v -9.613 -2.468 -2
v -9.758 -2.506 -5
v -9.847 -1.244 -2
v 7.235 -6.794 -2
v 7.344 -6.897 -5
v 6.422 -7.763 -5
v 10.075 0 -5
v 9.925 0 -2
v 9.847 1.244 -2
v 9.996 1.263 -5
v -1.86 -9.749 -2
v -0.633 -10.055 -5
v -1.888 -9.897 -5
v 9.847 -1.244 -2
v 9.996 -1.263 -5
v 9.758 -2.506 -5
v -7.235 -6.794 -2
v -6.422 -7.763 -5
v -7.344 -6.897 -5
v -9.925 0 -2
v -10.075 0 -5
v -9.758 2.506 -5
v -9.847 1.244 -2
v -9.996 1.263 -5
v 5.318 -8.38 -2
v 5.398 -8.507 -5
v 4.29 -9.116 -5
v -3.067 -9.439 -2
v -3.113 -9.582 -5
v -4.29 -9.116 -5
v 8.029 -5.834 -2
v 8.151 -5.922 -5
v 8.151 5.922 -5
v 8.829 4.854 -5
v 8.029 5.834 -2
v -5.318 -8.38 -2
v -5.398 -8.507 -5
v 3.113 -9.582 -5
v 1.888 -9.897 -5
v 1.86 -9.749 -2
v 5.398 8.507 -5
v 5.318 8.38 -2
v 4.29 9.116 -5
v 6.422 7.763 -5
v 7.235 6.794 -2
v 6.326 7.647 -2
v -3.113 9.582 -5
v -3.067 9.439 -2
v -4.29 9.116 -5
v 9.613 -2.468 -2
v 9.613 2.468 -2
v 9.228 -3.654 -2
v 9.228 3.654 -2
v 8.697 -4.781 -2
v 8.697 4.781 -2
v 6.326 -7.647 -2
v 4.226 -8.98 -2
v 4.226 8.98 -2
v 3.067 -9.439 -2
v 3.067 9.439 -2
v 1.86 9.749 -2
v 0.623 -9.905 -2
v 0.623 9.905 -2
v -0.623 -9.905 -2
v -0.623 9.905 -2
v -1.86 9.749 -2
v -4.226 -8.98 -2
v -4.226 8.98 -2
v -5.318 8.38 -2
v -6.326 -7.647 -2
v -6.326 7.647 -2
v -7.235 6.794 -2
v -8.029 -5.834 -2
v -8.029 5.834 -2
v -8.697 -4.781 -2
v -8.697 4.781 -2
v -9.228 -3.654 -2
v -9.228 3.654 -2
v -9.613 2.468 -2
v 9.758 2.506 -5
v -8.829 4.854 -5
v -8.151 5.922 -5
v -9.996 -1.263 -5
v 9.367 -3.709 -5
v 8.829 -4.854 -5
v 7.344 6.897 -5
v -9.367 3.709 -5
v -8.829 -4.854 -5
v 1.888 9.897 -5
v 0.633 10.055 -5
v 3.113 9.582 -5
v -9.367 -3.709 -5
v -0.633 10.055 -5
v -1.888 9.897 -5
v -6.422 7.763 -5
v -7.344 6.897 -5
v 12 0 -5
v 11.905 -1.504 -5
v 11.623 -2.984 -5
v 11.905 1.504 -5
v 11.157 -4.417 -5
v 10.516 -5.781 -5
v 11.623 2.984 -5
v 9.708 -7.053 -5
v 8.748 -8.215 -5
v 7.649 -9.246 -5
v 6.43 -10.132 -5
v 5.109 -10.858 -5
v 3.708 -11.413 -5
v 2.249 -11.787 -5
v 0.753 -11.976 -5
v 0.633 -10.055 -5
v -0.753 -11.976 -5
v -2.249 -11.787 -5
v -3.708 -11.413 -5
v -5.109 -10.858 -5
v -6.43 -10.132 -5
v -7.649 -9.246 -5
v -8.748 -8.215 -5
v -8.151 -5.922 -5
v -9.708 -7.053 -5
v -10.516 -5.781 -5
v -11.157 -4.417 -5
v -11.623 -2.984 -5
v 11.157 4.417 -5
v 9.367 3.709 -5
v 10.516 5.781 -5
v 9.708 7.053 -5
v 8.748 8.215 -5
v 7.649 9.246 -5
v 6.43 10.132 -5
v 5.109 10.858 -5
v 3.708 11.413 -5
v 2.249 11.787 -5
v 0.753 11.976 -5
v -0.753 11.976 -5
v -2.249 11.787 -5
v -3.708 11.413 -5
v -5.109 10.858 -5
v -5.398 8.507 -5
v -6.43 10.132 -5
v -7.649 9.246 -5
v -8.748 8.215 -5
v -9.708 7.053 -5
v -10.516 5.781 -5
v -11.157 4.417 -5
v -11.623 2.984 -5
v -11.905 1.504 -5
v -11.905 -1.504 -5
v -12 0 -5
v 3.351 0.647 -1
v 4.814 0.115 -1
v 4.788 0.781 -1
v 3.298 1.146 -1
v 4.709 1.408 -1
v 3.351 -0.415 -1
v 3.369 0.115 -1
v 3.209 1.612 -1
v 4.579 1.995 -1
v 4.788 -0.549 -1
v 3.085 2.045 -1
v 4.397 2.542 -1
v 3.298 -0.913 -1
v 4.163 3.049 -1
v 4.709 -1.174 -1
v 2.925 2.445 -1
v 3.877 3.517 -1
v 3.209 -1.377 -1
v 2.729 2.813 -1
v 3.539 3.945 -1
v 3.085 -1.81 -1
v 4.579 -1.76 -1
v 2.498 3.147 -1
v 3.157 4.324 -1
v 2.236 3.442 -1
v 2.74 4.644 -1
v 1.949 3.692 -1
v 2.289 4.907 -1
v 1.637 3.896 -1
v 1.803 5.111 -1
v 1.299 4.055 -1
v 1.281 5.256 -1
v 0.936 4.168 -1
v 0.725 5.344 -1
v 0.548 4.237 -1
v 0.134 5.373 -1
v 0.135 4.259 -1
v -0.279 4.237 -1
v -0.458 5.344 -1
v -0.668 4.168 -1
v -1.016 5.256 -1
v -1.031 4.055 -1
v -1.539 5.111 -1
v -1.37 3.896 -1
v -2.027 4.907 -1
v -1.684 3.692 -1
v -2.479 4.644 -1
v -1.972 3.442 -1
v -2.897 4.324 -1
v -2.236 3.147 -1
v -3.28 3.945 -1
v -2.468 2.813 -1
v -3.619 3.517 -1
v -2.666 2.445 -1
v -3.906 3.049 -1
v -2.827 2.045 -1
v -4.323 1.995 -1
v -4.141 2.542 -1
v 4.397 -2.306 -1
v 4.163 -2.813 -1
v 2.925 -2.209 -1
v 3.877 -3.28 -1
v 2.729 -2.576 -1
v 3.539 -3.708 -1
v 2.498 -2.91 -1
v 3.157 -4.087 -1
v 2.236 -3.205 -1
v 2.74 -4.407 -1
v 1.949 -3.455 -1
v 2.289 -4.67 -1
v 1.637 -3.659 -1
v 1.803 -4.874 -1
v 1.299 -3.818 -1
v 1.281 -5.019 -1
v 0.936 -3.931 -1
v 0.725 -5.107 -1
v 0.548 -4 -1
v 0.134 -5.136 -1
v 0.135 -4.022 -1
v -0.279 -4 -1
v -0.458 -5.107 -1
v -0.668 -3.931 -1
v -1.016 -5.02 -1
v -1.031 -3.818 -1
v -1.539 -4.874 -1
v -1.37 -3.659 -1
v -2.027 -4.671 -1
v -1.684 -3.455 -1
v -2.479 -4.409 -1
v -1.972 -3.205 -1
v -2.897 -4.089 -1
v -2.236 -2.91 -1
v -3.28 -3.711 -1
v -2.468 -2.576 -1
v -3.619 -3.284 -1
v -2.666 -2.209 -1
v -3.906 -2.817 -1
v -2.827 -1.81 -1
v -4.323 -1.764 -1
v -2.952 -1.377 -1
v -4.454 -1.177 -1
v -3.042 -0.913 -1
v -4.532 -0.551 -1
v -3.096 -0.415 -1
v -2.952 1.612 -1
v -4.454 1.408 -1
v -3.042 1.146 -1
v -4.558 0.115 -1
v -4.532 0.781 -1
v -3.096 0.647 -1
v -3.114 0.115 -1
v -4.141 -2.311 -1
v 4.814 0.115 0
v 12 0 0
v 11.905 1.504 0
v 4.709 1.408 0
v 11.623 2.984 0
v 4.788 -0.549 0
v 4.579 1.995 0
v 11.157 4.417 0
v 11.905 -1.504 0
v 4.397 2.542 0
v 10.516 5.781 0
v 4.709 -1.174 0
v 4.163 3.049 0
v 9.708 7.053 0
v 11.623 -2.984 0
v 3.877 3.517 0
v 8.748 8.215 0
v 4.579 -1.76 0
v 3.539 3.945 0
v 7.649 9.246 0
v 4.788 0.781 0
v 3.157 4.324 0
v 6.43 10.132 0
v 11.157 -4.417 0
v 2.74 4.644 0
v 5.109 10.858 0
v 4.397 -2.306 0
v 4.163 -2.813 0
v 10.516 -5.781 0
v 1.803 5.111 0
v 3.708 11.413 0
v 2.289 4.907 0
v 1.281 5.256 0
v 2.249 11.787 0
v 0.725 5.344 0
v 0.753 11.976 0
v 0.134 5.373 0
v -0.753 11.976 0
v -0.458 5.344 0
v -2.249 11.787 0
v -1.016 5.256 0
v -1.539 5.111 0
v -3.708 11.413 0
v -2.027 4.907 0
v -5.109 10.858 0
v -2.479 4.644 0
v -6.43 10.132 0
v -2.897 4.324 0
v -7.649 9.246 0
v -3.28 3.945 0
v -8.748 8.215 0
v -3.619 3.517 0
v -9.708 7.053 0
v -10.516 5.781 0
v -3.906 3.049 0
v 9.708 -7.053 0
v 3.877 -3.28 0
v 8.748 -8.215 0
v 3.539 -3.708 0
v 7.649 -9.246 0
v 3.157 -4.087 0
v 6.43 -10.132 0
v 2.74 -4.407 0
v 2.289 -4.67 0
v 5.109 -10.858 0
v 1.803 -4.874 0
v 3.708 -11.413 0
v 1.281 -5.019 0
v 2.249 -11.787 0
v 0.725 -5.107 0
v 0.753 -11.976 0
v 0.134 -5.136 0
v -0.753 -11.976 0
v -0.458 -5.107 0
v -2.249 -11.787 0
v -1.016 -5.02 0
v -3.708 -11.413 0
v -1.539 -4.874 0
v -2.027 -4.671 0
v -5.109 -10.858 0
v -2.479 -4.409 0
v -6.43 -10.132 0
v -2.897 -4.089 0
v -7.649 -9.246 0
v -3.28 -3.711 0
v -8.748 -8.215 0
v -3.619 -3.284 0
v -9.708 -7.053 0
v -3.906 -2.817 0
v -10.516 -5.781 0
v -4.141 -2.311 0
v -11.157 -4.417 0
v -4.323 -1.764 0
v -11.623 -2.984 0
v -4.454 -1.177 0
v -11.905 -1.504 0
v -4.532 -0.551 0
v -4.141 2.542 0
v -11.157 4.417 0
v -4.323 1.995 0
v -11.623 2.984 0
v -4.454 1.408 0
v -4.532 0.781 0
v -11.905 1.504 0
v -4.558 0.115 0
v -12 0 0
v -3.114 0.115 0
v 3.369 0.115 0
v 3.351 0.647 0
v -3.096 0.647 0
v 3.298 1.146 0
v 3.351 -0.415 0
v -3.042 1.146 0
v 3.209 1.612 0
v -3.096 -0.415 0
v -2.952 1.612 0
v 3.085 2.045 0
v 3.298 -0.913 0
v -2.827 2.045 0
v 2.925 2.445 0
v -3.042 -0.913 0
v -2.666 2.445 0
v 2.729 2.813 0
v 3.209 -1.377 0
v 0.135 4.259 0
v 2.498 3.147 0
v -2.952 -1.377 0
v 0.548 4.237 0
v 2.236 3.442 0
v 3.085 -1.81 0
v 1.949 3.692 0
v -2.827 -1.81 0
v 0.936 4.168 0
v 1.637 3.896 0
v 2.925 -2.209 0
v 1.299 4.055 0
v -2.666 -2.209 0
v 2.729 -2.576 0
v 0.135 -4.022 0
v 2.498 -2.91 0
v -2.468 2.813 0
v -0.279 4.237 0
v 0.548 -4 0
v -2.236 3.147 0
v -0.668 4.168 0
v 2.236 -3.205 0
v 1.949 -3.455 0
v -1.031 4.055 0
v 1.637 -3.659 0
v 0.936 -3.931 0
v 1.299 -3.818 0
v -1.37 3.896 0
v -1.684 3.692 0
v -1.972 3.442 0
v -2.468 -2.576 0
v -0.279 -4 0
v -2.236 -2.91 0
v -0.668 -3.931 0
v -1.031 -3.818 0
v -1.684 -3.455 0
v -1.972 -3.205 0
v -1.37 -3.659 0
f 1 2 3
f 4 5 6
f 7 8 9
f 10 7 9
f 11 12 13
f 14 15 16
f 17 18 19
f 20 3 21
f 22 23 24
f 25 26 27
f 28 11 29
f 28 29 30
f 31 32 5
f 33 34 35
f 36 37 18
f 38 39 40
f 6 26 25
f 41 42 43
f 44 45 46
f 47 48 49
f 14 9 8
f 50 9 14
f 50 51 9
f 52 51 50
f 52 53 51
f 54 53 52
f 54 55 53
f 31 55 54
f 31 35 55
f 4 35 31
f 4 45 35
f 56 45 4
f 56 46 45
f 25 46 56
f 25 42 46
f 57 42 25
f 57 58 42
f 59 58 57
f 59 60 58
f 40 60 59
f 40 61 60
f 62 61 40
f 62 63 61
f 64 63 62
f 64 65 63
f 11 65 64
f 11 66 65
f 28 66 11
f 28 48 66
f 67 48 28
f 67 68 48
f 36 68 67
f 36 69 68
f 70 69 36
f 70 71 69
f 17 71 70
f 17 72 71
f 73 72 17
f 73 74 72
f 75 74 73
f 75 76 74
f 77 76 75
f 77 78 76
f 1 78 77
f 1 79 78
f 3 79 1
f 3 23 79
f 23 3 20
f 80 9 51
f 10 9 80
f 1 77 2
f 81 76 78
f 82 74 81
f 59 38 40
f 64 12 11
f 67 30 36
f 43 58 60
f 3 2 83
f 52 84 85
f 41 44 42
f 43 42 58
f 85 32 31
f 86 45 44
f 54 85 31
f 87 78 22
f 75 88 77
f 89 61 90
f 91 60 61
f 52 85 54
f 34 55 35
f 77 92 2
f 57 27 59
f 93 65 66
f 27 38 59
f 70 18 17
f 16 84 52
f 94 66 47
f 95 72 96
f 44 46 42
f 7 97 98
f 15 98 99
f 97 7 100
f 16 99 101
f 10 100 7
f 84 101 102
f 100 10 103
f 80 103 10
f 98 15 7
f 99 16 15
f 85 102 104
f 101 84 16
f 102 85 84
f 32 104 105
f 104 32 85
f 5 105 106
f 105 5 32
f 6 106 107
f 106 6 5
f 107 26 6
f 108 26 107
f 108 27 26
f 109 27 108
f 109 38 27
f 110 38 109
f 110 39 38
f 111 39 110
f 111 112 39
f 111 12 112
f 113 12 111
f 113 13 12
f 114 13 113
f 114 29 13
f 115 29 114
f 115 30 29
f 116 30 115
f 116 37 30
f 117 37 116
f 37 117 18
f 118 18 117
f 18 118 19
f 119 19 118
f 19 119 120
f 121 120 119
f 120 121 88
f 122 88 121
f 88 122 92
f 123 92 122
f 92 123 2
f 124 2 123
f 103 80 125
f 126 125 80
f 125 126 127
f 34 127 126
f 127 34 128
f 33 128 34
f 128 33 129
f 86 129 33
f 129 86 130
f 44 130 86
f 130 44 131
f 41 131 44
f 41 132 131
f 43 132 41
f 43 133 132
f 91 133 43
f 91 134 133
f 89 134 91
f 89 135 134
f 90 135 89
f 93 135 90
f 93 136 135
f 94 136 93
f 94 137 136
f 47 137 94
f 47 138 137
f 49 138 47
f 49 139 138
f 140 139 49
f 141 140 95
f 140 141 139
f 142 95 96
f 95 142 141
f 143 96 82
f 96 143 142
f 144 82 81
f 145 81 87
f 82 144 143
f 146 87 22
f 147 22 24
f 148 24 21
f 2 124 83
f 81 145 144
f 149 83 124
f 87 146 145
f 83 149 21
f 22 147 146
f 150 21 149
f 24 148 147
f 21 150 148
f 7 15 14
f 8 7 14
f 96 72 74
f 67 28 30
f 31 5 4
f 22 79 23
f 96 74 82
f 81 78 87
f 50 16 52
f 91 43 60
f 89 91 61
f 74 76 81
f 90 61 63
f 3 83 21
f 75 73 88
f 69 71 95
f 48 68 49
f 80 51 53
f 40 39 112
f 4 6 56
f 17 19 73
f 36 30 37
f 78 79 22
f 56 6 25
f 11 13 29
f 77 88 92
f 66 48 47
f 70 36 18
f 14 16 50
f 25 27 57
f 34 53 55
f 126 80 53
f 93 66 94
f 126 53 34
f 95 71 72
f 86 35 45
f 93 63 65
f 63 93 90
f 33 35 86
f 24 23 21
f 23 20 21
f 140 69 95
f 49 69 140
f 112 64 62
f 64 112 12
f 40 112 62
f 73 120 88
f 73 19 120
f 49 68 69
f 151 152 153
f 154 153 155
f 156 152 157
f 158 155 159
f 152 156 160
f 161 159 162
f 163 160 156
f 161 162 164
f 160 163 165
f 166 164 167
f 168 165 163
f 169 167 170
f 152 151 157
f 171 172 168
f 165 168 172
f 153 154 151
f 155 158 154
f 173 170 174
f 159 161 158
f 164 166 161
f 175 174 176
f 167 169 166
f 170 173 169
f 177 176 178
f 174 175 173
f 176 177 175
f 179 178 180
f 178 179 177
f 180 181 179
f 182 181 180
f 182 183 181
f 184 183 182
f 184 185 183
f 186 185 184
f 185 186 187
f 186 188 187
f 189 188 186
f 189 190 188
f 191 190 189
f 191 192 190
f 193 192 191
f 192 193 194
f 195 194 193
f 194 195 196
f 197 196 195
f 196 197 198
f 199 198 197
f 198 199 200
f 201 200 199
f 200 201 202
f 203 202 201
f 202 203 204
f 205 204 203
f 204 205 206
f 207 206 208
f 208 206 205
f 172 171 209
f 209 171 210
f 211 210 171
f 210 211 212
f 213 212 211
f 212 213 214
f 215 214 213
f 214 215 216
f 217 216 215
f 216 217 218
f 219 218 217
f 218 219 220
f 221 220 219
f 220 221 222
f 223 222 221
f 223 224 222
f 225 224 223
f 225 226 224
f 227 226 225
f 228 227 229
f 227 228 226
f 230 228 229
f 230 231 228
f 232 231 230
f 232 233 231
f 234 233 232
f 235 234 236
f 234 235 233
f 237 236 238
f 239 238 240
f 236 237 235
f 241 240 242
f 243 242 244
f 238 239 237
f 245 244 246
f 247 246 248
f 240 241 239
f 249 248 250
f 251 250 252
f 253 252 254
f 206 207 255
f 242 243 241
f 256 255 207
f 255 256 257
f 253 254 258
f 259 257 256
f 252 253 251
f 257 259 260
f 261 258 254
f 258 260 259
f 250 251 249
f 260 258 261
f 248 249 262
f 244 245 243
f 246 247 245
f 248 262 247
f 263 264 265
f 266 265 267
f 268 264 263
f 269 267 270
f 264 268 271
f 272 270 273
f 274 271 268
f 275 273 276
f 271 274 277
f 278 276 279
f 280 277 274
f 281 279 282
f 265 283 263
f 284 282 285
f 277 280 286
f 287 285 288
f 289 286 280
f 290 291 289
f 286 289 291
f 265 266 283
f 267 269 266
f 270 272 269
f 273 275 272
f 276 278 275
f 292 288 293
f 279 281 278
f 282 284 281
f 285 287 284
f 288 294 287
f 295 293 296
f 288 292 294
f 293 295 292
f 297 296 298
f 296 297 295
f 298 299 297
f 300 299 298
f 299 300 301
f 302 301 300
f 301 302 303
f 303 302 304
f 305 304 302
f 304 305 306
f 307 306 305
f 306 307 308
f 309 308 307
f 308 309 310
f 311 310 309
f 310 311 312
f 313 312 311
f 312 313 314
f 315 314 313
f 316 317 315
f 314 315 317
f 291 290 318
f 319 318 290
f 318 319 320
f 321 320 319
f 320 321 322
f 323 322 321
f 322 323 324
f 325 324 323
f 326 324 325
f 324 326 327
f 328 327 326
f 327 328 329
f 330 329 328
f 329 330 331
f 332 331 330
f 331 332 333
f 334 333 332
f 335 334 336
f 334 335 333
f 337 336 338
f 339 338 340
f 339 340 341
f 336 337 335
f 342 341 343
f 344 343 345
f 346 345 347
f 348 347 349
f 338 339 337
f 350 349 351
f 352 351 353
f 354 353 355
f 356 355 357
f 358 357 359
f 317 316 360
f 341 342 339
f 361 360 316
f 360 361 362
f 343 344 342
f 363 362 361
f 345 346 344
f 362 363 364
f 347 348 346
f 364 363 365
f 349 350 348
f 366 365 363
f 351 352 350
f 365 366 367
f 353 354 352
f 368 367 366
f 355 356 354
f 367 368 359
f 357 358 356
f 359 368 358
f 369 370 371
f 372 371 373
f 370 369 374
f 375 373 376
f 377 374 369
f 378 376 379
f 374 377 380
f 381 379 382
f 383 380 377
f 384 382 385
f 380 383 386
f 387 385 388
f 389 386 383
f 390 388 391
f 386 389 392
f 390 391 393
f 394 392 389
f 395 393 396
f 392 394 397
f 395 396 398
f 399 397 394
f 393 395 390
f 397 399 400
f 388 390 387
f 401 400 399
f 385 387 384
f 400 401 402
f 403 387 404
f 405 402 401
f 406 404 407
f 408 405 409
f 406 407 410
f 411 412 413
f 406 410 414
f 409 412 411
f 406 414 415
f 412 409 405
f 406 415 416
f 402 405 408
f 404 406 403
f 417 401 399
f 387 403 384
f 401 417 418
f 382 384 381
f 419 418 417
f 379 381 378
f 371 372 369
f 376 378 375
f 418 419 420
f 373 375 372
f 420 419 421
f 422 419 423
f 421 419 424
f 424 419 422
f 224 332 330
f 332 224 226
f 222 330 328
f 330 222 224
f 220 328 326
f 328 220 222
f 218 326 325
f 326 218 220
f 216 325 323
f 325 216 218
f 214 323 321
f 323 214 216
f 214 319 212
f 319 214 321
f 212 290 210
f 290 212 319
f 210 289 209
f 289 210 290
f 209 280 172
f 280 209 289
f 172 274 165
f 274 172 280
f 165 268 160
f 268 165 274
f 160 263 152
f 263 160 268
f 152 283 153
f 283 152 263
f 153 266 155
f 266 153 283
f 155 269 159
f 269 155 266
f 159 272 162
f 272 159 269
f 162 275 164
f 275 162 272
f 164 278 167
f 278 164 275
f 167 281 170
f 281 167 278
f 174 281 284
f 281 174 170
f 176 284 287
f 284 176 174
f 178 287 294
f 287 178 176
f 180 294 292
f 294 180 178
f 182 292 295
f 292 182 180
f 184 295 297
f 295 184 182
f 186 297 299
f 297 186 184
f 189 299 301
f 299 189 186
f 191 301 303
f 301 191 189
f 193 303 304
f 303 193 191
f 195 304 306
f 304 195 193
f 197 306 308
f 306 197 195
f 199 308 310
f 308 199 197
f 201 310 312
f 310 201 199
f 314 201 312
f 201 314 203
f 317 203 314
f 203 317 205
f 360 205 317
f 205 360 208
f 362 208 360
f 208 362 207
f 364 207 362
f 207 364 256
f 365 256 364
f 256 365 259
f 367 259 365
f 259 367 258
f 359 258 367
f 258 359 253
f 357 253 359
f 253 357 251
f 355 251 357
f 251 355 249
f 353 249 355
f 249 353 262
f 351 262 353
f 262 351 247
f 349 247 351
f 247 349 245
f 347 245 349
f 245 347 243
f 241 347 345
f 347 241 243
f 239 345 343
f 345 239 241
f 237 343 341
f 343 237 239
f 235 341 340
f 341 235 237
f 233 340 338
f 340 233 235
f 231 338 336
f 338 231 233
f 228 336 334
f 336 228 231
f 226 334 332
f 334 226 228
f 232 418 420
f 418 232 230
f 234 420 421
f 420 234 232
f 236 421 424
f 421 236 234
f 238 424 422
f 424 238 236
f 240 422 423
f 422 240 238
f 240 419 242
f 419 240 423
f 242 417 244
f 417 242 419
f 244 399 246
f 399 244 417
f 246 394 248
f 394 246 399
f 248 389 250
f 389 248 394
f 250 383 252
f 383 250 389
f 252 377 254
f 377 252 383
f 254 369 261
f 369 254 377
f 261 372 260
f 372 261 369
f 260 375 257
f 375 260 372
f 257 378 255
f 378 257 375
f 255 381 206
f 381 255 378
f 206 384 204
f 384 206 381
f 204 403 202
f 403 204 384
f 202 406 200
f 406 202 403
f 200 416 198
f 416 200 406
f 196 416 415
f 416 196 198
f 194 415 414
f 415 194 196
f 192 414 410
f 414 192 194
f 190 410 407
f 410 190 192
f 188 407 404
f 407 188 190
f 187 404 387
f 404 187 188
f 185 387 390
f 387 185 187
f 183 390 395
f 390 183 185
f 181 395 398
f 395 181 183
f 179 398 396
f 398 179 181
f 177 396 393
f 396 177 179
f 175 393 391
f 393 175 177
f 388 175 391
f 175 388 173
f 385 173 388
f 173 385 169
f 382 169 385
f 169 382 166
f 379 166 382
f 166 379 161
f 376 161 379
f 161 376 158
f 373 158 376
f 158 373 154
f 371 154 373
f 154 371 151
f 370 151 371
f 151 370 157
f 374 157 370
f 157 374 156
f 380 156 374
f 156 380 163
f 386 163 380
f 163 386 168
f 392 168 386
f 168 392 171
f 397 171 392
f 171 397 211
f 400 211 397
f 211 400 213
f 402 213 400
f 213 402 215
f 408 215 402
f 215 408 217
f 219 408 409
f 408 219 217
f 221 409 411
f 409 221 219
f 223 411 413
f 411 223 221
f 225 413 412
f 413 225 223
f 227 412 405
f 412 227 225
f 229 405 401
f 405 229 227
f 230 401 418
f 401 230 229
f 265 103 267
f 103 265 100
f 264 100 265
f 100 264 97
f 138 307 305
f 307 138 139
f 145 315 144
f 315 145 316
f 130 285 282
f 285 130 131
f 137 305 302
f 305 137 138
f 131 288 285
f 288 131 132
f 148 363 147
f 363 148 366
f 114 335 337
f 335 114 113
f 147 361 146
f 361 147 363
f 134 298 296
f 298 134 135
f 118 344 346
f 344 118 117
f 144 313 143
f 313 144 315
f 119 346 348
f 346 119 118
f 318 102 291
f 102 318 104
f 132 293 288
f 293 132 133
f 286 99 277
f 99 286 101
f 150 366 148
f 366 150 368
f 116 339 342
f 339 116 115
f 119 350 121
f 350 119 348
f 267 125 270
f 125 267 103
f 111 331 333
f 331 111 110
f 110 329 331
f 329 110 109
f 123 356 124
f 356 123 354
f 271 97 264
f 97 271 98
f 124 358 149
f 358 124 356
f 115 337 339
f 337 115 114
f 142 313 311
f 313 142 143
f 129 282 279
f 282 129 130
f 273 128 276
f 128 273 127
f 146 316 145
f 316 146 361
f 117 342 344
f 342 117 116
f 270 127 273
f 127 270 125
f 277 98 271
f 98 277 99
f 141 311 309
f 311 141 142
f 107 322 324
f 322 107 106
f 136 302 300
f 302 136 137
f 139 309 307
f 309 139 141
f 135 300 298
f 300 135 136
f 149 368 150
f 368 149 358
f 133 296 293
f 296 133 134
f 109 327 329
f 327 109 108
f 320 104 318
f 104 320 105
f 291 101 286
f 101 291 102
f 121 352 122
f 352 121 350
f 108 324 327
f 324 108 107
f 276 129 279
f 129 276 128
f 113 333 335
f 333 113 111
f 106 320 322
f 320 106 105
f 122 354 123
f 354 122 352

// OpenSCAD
$fn = 50;

difference() {
	union() {
		translate(v = [0, 0, -5.0]) {
			cylinder(h = 5, r = 12.0);
		}
	}
	union() {
		#translate(v = [0, 0, -5.0]) {
			cylinder(h = 3, r1 = 10.075, r2 = 9.925);
		}
		translate(v = [0, 0, -1]) {
			linear_extrude(height = 1) {
				text(font = "Impact", halign = "center", size = 10, text = "O", valign = "center");
			}
		}
	}
}
